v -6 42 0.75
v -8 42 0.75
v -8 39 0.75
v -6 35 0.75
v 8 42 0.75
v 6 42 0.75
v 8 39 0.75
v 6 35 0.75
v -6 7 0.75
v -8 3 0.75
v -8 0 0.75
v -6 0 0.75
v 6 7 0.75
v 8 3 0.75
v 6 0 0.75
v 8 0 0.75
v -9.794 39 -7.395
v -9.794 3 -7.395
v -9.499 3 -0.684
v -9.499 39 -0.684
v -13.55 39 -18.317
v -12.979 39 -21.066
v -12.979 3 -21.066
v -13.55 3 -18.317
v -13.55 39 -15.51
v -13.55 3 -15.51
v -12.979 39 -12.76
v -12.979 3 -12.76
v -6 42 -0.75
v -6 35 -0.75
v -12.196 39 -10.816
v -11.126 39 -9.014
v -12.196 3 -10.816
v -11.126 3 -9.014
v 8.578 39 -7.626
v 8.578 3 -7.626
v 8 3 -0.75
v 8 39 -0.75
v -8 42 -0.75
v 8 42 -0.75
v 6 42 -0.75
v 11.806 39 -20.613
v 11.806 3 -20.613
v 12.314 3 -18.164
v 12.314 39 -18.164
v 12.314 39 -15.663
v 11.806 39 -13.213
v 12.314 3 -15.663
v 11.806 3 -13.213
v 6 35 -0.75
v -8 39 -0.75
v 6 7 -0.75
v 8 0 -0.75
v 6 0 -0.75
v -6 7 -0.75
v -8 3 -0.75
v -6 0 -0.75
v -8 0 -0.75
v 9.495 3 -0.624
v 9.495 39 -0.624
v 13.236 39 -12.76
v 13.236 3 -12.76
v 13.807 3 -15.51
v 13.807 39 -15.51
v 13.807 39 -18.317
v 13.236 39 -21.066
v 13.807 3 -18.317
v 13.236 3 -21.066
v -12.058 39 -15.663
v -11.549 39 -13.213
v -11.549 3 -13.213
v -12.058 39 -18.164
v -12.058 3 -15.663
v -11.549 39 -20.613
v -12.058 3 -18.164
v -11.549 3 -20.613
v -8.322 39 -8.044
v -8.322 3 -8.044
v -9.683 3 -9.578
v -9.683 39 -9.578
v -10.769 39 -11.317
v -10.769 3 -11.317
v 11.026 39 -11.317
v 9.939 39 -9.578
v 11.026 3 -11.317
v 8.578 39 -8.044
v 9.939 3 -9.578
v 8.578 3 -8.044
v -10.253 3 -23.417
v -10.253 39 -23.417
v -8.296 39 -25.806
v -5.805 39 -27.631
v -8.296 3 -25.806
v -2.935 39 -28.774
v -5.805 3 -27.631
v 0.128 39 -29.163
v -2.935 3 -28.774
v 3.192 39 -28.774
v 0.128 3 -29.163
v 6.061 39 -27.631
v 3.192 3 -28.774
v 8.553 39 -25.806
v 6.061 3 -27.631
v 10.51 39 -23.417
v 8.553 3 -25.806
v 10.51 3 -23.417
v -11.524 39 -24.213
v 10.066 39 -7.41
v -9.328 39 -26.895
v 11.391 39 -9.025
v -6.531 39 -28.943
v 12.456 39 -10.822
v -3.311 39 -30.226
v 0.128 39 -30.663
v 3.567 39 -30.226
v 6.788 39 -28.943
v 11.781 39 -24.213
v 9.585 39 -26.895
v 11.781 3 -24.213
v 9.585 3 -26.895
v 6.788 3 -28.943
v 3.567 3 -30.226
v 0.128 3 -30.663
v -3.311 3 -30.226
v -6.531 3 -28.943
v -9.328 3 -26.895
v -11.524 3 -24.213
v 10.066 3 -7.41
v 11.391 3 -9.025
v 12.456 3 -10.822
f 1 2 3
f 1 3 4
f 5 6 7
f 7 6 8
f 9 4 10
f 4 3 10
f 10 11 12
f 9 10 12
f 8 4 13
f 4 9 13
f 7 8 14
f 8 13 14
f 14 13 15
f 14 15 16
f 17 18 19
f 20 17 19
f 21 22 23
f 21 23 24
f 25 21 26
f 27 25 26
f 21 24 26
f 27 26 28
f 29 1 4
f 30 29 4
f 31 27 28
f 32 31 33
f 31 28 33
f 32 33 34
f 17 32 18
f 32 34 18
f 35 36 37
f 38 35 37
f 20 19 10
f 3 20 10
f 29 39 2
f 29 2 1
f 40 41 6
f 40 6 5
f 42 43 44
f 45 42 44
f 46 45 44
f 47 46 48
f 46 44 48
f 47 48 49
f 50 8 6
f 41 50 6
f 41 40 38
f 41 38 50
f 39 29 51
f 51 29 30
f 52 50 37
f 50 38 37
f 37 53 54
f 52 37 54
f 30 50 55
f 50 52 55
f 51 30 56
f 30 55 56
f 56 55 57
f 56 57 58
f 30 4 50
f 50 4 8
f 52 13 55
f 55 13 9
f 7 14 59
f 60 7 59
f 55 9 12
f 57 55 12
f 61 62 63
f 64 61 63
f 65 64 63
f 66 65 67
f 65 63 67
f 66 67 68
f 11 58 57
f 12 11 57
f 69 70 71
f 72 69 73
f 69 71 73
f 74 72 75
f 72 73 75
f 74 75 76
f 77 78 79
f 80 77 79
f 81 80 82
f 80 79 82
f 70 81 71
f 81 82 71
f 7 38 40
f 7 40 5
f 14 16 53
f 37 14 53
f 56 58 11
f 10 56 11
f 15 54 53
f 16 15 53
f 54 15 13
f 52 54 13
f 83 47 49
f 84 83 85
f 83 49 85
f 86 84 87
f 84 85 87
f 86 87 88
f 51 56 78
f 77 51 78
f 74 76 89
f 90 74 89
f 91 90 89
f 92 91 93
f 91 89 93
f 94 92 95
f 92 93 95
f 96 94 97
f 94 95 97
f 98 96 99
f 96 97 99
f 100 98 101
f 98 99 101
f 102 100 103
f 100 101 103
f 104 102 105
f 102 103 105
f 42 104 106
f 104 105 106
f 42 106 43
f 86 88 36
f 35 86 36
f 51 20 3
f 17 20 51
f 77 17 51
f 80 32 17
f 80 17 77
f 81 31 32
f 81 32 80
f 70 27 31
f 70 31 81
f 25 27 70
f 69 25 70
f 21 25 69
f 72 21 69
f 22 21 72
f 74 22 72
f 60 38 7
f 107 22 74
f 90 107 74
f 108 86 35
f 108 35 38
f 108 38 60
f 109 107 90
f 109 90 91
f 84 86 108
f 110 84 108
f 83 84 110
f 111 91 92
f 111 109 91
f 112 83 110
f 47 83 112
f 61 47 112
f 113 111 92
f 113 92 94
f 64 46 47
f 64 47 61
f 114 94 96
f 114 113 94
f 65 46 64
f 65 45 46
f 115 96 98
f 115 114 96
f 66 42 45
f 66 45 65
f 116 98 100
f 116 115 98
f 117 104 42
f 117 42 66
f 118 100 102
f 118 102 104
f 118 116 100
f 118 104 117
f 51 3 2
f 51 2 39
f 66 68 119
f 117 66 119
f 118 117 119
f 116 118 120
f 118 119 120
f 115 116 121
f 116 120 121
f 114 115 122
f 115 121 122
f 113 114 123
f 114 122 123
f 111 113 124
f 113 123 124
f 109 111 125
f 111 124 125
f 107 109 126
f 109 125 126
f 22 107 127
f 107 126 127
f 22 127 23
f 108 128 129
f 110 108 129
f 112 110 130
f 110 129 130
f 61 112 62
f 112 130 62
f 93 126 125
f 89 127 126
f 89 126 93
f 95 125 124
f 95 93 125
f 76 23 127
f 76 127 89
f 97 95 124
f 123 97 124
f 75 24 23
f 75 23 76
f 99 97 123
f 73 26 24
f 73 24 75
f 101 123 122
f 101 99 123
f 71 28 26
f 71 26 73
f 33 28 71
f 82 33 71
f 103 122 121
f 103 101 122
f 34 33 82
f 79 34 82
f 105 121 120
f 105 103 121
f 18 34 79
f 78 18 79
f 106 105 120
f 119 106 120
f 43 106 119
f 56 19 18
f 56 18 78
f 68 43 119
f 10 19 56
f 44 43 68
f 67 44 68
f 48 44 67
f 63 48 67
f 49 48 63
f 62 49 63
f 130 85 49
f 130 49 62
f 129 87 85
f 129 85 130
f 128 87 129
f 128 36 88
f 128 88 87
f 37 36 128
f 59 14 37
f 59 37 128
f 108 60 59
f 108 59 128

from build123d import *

# Parameters (mm, degrees)
EXTRUDE_1_DEPTH     = 42
CUT_EXTRUDE_START   = -3
CUT_EXTRUDE_3_DEPTH = 3
CUT_EXTRUDE_4_DEPTH = 3
CUT_EXTRUDE_5_DEPTH = 2


# Read off the part's stored shape, not the designer's step: Вырез-Вытянуть3
with BuildPart() as part:
    # Эскиз1 → Бобышка-Вытянуть1 (new body)
    with BuildSketch(Plane(origin=(0, 0, 0), x_dir=(1, 0, 0), z_dir=(0, 1, 0))):
        with BuildLine():
            Line((-8, -0.75), (8, -0.75))
            Line((8, -0.75), (9.494720433, 0.624258888))
            Line((9.494720433, 0.624258888), (10.065554034, 7.409920575))
            ThreePointArc((10.065554034, 7.409920575), (11.957363782, 9.903499319), (13.236218518, 12.760317415))
            ThreePointArc((13.236218518, 12.760317415), (13.878412353, 16.91337864), (13.236218518, 21.066439864))
            ThreePointArc((13.236218518, 21.066439864), (0.128412353, 30.66337864), (-12.979393813, 21.066439864))
            ThreePointArc((-12.979393813, 21.066439864), (-13.621587647, 16.91337864), (-12.979393813, 12.760317415))
            ThreePointArc((-12.979393813, 12.760317415), (-11.695261173, 9.894600658), (-9.794416407, 7.394977019))
            Line((-9.794416407, 7.394977019), (-9.498544352, 0.683933169))
            Line((-9.498544352, 0.683933169), (-8, -0.75))
        make_face()
        with BuildLine():
            Line((8.578412353, 7.625752463), (8, 0.75))
            Line((8, 0.75), (-8, 0.75))
            Line((-8, 0.75), (-8.321587647, 8.04433134))
            ThreePointArc((-8.321587647, 8.04433134), (-10.262087468, 10.424926322), (-11.549451322, 13.21337864))
            ThreePointArc((-11.549451322, 13.21337864), (-12.121587647, 16.91337864), (-11.549451322, 20.61337864))
            ThreePointArc((-11.549451322, 20.61337864), (0.128412353, 29.16337864), (11.806276027, 20.61337864))
            ThreePointArc((11.806276027, 20.61337864), (12.378412353, 16.91337864), (11.806276027, 13.21337864))
            ThreePointArc((11.806276027, 13.21337864), (10.518912173, 10.424926322), (8.578412353, 8.04433134))
            Line((8.578412353, 8.04433134), (8.578412353, 7.625752463))
        make_face(mode=Mode.SUBTRACT)
    extrude(amount=EXTRUDE_1_DEPTH)

    # Вырез-Вытянуть3 outline → Вырез-Вытянуть3 (cut)
    with BuildSketch(Plane(origin=(0, 42, 0), x_dir=(1, 0, 0), z_dir=(0, 1, 0)).offset(CUT_EXTRUDE_START)):
        with BuildLine():
            Line((-9.498544352, 0.683933169), (-8, -0.75))
            Line((-8, -0.75), (-8, 0.75))
            Line((-8, 0.75), (-8.321587647, 8.04433134))
            ThreePointArc((-8.321587647, 8.04433134), (0.128412353, 29.16337864), (8.578412353, 8.04433134))
            Line((8.578412353, 8.04433134), (8.578412353, 7.625752463))
            Line((8.578412353, 7.625752463), (8, 0.75))
            Line((8, 0.75), (8, -0.75))
            Line((8, -0.75), (9.494720433, 0.624258888))
            Line((9.494720433, 0.624258888), (10.065554034, 7.409920575))
            ThreePointArc((10.065554034, 7.409920575), (0.118066222, 30.663374747), (-9.794416407, 7.394977019))
            Line((-9.794416407, 7.394977019), (-9.498544352, 0.683933169))
        make_face()
    extrude(amount=CUT_EXTRUDE_3_DEPTH, mode=Mode.SUBTRACT)

    # Эскиз5 → Вырез-Вытянуть4 (cut)
    with BuildSketch(Plane.XZ):
        Polygon((-15.223121419, -31.649837006), (15.223121419, -31.649837006), (15.223121419, -0.75), (15.223121419, 0.75), (8, 0.75), (8, -0.75), (-8, -0.75), (-8, 0.75), (-15.223121419, 0.75), (-15.223121419, -0.75), align=None)
    extrude(amount=-CUT_EXTRUDE_4_DEPTH, mode=Mode.SUBTRACT)

    # Эскиз2 → Вырез-Вытянуть5 (cut)
    with BuildSketch(Plane.XY.offset(0.75)):
        Polygon((-6, 3), (-6, 0), (6, 0), (6, 3), (6, 7), (-6, 7), align=None)
        Polygon((-6, 39), (-6, 35), (6, 35), (6, 39), (6, 42), (-6, 42), align=None)
    extrude(amount=-CUT_EXTRUDE_5_DEPTH, mode=Mode.SUBTRACT)


solid = part.part
